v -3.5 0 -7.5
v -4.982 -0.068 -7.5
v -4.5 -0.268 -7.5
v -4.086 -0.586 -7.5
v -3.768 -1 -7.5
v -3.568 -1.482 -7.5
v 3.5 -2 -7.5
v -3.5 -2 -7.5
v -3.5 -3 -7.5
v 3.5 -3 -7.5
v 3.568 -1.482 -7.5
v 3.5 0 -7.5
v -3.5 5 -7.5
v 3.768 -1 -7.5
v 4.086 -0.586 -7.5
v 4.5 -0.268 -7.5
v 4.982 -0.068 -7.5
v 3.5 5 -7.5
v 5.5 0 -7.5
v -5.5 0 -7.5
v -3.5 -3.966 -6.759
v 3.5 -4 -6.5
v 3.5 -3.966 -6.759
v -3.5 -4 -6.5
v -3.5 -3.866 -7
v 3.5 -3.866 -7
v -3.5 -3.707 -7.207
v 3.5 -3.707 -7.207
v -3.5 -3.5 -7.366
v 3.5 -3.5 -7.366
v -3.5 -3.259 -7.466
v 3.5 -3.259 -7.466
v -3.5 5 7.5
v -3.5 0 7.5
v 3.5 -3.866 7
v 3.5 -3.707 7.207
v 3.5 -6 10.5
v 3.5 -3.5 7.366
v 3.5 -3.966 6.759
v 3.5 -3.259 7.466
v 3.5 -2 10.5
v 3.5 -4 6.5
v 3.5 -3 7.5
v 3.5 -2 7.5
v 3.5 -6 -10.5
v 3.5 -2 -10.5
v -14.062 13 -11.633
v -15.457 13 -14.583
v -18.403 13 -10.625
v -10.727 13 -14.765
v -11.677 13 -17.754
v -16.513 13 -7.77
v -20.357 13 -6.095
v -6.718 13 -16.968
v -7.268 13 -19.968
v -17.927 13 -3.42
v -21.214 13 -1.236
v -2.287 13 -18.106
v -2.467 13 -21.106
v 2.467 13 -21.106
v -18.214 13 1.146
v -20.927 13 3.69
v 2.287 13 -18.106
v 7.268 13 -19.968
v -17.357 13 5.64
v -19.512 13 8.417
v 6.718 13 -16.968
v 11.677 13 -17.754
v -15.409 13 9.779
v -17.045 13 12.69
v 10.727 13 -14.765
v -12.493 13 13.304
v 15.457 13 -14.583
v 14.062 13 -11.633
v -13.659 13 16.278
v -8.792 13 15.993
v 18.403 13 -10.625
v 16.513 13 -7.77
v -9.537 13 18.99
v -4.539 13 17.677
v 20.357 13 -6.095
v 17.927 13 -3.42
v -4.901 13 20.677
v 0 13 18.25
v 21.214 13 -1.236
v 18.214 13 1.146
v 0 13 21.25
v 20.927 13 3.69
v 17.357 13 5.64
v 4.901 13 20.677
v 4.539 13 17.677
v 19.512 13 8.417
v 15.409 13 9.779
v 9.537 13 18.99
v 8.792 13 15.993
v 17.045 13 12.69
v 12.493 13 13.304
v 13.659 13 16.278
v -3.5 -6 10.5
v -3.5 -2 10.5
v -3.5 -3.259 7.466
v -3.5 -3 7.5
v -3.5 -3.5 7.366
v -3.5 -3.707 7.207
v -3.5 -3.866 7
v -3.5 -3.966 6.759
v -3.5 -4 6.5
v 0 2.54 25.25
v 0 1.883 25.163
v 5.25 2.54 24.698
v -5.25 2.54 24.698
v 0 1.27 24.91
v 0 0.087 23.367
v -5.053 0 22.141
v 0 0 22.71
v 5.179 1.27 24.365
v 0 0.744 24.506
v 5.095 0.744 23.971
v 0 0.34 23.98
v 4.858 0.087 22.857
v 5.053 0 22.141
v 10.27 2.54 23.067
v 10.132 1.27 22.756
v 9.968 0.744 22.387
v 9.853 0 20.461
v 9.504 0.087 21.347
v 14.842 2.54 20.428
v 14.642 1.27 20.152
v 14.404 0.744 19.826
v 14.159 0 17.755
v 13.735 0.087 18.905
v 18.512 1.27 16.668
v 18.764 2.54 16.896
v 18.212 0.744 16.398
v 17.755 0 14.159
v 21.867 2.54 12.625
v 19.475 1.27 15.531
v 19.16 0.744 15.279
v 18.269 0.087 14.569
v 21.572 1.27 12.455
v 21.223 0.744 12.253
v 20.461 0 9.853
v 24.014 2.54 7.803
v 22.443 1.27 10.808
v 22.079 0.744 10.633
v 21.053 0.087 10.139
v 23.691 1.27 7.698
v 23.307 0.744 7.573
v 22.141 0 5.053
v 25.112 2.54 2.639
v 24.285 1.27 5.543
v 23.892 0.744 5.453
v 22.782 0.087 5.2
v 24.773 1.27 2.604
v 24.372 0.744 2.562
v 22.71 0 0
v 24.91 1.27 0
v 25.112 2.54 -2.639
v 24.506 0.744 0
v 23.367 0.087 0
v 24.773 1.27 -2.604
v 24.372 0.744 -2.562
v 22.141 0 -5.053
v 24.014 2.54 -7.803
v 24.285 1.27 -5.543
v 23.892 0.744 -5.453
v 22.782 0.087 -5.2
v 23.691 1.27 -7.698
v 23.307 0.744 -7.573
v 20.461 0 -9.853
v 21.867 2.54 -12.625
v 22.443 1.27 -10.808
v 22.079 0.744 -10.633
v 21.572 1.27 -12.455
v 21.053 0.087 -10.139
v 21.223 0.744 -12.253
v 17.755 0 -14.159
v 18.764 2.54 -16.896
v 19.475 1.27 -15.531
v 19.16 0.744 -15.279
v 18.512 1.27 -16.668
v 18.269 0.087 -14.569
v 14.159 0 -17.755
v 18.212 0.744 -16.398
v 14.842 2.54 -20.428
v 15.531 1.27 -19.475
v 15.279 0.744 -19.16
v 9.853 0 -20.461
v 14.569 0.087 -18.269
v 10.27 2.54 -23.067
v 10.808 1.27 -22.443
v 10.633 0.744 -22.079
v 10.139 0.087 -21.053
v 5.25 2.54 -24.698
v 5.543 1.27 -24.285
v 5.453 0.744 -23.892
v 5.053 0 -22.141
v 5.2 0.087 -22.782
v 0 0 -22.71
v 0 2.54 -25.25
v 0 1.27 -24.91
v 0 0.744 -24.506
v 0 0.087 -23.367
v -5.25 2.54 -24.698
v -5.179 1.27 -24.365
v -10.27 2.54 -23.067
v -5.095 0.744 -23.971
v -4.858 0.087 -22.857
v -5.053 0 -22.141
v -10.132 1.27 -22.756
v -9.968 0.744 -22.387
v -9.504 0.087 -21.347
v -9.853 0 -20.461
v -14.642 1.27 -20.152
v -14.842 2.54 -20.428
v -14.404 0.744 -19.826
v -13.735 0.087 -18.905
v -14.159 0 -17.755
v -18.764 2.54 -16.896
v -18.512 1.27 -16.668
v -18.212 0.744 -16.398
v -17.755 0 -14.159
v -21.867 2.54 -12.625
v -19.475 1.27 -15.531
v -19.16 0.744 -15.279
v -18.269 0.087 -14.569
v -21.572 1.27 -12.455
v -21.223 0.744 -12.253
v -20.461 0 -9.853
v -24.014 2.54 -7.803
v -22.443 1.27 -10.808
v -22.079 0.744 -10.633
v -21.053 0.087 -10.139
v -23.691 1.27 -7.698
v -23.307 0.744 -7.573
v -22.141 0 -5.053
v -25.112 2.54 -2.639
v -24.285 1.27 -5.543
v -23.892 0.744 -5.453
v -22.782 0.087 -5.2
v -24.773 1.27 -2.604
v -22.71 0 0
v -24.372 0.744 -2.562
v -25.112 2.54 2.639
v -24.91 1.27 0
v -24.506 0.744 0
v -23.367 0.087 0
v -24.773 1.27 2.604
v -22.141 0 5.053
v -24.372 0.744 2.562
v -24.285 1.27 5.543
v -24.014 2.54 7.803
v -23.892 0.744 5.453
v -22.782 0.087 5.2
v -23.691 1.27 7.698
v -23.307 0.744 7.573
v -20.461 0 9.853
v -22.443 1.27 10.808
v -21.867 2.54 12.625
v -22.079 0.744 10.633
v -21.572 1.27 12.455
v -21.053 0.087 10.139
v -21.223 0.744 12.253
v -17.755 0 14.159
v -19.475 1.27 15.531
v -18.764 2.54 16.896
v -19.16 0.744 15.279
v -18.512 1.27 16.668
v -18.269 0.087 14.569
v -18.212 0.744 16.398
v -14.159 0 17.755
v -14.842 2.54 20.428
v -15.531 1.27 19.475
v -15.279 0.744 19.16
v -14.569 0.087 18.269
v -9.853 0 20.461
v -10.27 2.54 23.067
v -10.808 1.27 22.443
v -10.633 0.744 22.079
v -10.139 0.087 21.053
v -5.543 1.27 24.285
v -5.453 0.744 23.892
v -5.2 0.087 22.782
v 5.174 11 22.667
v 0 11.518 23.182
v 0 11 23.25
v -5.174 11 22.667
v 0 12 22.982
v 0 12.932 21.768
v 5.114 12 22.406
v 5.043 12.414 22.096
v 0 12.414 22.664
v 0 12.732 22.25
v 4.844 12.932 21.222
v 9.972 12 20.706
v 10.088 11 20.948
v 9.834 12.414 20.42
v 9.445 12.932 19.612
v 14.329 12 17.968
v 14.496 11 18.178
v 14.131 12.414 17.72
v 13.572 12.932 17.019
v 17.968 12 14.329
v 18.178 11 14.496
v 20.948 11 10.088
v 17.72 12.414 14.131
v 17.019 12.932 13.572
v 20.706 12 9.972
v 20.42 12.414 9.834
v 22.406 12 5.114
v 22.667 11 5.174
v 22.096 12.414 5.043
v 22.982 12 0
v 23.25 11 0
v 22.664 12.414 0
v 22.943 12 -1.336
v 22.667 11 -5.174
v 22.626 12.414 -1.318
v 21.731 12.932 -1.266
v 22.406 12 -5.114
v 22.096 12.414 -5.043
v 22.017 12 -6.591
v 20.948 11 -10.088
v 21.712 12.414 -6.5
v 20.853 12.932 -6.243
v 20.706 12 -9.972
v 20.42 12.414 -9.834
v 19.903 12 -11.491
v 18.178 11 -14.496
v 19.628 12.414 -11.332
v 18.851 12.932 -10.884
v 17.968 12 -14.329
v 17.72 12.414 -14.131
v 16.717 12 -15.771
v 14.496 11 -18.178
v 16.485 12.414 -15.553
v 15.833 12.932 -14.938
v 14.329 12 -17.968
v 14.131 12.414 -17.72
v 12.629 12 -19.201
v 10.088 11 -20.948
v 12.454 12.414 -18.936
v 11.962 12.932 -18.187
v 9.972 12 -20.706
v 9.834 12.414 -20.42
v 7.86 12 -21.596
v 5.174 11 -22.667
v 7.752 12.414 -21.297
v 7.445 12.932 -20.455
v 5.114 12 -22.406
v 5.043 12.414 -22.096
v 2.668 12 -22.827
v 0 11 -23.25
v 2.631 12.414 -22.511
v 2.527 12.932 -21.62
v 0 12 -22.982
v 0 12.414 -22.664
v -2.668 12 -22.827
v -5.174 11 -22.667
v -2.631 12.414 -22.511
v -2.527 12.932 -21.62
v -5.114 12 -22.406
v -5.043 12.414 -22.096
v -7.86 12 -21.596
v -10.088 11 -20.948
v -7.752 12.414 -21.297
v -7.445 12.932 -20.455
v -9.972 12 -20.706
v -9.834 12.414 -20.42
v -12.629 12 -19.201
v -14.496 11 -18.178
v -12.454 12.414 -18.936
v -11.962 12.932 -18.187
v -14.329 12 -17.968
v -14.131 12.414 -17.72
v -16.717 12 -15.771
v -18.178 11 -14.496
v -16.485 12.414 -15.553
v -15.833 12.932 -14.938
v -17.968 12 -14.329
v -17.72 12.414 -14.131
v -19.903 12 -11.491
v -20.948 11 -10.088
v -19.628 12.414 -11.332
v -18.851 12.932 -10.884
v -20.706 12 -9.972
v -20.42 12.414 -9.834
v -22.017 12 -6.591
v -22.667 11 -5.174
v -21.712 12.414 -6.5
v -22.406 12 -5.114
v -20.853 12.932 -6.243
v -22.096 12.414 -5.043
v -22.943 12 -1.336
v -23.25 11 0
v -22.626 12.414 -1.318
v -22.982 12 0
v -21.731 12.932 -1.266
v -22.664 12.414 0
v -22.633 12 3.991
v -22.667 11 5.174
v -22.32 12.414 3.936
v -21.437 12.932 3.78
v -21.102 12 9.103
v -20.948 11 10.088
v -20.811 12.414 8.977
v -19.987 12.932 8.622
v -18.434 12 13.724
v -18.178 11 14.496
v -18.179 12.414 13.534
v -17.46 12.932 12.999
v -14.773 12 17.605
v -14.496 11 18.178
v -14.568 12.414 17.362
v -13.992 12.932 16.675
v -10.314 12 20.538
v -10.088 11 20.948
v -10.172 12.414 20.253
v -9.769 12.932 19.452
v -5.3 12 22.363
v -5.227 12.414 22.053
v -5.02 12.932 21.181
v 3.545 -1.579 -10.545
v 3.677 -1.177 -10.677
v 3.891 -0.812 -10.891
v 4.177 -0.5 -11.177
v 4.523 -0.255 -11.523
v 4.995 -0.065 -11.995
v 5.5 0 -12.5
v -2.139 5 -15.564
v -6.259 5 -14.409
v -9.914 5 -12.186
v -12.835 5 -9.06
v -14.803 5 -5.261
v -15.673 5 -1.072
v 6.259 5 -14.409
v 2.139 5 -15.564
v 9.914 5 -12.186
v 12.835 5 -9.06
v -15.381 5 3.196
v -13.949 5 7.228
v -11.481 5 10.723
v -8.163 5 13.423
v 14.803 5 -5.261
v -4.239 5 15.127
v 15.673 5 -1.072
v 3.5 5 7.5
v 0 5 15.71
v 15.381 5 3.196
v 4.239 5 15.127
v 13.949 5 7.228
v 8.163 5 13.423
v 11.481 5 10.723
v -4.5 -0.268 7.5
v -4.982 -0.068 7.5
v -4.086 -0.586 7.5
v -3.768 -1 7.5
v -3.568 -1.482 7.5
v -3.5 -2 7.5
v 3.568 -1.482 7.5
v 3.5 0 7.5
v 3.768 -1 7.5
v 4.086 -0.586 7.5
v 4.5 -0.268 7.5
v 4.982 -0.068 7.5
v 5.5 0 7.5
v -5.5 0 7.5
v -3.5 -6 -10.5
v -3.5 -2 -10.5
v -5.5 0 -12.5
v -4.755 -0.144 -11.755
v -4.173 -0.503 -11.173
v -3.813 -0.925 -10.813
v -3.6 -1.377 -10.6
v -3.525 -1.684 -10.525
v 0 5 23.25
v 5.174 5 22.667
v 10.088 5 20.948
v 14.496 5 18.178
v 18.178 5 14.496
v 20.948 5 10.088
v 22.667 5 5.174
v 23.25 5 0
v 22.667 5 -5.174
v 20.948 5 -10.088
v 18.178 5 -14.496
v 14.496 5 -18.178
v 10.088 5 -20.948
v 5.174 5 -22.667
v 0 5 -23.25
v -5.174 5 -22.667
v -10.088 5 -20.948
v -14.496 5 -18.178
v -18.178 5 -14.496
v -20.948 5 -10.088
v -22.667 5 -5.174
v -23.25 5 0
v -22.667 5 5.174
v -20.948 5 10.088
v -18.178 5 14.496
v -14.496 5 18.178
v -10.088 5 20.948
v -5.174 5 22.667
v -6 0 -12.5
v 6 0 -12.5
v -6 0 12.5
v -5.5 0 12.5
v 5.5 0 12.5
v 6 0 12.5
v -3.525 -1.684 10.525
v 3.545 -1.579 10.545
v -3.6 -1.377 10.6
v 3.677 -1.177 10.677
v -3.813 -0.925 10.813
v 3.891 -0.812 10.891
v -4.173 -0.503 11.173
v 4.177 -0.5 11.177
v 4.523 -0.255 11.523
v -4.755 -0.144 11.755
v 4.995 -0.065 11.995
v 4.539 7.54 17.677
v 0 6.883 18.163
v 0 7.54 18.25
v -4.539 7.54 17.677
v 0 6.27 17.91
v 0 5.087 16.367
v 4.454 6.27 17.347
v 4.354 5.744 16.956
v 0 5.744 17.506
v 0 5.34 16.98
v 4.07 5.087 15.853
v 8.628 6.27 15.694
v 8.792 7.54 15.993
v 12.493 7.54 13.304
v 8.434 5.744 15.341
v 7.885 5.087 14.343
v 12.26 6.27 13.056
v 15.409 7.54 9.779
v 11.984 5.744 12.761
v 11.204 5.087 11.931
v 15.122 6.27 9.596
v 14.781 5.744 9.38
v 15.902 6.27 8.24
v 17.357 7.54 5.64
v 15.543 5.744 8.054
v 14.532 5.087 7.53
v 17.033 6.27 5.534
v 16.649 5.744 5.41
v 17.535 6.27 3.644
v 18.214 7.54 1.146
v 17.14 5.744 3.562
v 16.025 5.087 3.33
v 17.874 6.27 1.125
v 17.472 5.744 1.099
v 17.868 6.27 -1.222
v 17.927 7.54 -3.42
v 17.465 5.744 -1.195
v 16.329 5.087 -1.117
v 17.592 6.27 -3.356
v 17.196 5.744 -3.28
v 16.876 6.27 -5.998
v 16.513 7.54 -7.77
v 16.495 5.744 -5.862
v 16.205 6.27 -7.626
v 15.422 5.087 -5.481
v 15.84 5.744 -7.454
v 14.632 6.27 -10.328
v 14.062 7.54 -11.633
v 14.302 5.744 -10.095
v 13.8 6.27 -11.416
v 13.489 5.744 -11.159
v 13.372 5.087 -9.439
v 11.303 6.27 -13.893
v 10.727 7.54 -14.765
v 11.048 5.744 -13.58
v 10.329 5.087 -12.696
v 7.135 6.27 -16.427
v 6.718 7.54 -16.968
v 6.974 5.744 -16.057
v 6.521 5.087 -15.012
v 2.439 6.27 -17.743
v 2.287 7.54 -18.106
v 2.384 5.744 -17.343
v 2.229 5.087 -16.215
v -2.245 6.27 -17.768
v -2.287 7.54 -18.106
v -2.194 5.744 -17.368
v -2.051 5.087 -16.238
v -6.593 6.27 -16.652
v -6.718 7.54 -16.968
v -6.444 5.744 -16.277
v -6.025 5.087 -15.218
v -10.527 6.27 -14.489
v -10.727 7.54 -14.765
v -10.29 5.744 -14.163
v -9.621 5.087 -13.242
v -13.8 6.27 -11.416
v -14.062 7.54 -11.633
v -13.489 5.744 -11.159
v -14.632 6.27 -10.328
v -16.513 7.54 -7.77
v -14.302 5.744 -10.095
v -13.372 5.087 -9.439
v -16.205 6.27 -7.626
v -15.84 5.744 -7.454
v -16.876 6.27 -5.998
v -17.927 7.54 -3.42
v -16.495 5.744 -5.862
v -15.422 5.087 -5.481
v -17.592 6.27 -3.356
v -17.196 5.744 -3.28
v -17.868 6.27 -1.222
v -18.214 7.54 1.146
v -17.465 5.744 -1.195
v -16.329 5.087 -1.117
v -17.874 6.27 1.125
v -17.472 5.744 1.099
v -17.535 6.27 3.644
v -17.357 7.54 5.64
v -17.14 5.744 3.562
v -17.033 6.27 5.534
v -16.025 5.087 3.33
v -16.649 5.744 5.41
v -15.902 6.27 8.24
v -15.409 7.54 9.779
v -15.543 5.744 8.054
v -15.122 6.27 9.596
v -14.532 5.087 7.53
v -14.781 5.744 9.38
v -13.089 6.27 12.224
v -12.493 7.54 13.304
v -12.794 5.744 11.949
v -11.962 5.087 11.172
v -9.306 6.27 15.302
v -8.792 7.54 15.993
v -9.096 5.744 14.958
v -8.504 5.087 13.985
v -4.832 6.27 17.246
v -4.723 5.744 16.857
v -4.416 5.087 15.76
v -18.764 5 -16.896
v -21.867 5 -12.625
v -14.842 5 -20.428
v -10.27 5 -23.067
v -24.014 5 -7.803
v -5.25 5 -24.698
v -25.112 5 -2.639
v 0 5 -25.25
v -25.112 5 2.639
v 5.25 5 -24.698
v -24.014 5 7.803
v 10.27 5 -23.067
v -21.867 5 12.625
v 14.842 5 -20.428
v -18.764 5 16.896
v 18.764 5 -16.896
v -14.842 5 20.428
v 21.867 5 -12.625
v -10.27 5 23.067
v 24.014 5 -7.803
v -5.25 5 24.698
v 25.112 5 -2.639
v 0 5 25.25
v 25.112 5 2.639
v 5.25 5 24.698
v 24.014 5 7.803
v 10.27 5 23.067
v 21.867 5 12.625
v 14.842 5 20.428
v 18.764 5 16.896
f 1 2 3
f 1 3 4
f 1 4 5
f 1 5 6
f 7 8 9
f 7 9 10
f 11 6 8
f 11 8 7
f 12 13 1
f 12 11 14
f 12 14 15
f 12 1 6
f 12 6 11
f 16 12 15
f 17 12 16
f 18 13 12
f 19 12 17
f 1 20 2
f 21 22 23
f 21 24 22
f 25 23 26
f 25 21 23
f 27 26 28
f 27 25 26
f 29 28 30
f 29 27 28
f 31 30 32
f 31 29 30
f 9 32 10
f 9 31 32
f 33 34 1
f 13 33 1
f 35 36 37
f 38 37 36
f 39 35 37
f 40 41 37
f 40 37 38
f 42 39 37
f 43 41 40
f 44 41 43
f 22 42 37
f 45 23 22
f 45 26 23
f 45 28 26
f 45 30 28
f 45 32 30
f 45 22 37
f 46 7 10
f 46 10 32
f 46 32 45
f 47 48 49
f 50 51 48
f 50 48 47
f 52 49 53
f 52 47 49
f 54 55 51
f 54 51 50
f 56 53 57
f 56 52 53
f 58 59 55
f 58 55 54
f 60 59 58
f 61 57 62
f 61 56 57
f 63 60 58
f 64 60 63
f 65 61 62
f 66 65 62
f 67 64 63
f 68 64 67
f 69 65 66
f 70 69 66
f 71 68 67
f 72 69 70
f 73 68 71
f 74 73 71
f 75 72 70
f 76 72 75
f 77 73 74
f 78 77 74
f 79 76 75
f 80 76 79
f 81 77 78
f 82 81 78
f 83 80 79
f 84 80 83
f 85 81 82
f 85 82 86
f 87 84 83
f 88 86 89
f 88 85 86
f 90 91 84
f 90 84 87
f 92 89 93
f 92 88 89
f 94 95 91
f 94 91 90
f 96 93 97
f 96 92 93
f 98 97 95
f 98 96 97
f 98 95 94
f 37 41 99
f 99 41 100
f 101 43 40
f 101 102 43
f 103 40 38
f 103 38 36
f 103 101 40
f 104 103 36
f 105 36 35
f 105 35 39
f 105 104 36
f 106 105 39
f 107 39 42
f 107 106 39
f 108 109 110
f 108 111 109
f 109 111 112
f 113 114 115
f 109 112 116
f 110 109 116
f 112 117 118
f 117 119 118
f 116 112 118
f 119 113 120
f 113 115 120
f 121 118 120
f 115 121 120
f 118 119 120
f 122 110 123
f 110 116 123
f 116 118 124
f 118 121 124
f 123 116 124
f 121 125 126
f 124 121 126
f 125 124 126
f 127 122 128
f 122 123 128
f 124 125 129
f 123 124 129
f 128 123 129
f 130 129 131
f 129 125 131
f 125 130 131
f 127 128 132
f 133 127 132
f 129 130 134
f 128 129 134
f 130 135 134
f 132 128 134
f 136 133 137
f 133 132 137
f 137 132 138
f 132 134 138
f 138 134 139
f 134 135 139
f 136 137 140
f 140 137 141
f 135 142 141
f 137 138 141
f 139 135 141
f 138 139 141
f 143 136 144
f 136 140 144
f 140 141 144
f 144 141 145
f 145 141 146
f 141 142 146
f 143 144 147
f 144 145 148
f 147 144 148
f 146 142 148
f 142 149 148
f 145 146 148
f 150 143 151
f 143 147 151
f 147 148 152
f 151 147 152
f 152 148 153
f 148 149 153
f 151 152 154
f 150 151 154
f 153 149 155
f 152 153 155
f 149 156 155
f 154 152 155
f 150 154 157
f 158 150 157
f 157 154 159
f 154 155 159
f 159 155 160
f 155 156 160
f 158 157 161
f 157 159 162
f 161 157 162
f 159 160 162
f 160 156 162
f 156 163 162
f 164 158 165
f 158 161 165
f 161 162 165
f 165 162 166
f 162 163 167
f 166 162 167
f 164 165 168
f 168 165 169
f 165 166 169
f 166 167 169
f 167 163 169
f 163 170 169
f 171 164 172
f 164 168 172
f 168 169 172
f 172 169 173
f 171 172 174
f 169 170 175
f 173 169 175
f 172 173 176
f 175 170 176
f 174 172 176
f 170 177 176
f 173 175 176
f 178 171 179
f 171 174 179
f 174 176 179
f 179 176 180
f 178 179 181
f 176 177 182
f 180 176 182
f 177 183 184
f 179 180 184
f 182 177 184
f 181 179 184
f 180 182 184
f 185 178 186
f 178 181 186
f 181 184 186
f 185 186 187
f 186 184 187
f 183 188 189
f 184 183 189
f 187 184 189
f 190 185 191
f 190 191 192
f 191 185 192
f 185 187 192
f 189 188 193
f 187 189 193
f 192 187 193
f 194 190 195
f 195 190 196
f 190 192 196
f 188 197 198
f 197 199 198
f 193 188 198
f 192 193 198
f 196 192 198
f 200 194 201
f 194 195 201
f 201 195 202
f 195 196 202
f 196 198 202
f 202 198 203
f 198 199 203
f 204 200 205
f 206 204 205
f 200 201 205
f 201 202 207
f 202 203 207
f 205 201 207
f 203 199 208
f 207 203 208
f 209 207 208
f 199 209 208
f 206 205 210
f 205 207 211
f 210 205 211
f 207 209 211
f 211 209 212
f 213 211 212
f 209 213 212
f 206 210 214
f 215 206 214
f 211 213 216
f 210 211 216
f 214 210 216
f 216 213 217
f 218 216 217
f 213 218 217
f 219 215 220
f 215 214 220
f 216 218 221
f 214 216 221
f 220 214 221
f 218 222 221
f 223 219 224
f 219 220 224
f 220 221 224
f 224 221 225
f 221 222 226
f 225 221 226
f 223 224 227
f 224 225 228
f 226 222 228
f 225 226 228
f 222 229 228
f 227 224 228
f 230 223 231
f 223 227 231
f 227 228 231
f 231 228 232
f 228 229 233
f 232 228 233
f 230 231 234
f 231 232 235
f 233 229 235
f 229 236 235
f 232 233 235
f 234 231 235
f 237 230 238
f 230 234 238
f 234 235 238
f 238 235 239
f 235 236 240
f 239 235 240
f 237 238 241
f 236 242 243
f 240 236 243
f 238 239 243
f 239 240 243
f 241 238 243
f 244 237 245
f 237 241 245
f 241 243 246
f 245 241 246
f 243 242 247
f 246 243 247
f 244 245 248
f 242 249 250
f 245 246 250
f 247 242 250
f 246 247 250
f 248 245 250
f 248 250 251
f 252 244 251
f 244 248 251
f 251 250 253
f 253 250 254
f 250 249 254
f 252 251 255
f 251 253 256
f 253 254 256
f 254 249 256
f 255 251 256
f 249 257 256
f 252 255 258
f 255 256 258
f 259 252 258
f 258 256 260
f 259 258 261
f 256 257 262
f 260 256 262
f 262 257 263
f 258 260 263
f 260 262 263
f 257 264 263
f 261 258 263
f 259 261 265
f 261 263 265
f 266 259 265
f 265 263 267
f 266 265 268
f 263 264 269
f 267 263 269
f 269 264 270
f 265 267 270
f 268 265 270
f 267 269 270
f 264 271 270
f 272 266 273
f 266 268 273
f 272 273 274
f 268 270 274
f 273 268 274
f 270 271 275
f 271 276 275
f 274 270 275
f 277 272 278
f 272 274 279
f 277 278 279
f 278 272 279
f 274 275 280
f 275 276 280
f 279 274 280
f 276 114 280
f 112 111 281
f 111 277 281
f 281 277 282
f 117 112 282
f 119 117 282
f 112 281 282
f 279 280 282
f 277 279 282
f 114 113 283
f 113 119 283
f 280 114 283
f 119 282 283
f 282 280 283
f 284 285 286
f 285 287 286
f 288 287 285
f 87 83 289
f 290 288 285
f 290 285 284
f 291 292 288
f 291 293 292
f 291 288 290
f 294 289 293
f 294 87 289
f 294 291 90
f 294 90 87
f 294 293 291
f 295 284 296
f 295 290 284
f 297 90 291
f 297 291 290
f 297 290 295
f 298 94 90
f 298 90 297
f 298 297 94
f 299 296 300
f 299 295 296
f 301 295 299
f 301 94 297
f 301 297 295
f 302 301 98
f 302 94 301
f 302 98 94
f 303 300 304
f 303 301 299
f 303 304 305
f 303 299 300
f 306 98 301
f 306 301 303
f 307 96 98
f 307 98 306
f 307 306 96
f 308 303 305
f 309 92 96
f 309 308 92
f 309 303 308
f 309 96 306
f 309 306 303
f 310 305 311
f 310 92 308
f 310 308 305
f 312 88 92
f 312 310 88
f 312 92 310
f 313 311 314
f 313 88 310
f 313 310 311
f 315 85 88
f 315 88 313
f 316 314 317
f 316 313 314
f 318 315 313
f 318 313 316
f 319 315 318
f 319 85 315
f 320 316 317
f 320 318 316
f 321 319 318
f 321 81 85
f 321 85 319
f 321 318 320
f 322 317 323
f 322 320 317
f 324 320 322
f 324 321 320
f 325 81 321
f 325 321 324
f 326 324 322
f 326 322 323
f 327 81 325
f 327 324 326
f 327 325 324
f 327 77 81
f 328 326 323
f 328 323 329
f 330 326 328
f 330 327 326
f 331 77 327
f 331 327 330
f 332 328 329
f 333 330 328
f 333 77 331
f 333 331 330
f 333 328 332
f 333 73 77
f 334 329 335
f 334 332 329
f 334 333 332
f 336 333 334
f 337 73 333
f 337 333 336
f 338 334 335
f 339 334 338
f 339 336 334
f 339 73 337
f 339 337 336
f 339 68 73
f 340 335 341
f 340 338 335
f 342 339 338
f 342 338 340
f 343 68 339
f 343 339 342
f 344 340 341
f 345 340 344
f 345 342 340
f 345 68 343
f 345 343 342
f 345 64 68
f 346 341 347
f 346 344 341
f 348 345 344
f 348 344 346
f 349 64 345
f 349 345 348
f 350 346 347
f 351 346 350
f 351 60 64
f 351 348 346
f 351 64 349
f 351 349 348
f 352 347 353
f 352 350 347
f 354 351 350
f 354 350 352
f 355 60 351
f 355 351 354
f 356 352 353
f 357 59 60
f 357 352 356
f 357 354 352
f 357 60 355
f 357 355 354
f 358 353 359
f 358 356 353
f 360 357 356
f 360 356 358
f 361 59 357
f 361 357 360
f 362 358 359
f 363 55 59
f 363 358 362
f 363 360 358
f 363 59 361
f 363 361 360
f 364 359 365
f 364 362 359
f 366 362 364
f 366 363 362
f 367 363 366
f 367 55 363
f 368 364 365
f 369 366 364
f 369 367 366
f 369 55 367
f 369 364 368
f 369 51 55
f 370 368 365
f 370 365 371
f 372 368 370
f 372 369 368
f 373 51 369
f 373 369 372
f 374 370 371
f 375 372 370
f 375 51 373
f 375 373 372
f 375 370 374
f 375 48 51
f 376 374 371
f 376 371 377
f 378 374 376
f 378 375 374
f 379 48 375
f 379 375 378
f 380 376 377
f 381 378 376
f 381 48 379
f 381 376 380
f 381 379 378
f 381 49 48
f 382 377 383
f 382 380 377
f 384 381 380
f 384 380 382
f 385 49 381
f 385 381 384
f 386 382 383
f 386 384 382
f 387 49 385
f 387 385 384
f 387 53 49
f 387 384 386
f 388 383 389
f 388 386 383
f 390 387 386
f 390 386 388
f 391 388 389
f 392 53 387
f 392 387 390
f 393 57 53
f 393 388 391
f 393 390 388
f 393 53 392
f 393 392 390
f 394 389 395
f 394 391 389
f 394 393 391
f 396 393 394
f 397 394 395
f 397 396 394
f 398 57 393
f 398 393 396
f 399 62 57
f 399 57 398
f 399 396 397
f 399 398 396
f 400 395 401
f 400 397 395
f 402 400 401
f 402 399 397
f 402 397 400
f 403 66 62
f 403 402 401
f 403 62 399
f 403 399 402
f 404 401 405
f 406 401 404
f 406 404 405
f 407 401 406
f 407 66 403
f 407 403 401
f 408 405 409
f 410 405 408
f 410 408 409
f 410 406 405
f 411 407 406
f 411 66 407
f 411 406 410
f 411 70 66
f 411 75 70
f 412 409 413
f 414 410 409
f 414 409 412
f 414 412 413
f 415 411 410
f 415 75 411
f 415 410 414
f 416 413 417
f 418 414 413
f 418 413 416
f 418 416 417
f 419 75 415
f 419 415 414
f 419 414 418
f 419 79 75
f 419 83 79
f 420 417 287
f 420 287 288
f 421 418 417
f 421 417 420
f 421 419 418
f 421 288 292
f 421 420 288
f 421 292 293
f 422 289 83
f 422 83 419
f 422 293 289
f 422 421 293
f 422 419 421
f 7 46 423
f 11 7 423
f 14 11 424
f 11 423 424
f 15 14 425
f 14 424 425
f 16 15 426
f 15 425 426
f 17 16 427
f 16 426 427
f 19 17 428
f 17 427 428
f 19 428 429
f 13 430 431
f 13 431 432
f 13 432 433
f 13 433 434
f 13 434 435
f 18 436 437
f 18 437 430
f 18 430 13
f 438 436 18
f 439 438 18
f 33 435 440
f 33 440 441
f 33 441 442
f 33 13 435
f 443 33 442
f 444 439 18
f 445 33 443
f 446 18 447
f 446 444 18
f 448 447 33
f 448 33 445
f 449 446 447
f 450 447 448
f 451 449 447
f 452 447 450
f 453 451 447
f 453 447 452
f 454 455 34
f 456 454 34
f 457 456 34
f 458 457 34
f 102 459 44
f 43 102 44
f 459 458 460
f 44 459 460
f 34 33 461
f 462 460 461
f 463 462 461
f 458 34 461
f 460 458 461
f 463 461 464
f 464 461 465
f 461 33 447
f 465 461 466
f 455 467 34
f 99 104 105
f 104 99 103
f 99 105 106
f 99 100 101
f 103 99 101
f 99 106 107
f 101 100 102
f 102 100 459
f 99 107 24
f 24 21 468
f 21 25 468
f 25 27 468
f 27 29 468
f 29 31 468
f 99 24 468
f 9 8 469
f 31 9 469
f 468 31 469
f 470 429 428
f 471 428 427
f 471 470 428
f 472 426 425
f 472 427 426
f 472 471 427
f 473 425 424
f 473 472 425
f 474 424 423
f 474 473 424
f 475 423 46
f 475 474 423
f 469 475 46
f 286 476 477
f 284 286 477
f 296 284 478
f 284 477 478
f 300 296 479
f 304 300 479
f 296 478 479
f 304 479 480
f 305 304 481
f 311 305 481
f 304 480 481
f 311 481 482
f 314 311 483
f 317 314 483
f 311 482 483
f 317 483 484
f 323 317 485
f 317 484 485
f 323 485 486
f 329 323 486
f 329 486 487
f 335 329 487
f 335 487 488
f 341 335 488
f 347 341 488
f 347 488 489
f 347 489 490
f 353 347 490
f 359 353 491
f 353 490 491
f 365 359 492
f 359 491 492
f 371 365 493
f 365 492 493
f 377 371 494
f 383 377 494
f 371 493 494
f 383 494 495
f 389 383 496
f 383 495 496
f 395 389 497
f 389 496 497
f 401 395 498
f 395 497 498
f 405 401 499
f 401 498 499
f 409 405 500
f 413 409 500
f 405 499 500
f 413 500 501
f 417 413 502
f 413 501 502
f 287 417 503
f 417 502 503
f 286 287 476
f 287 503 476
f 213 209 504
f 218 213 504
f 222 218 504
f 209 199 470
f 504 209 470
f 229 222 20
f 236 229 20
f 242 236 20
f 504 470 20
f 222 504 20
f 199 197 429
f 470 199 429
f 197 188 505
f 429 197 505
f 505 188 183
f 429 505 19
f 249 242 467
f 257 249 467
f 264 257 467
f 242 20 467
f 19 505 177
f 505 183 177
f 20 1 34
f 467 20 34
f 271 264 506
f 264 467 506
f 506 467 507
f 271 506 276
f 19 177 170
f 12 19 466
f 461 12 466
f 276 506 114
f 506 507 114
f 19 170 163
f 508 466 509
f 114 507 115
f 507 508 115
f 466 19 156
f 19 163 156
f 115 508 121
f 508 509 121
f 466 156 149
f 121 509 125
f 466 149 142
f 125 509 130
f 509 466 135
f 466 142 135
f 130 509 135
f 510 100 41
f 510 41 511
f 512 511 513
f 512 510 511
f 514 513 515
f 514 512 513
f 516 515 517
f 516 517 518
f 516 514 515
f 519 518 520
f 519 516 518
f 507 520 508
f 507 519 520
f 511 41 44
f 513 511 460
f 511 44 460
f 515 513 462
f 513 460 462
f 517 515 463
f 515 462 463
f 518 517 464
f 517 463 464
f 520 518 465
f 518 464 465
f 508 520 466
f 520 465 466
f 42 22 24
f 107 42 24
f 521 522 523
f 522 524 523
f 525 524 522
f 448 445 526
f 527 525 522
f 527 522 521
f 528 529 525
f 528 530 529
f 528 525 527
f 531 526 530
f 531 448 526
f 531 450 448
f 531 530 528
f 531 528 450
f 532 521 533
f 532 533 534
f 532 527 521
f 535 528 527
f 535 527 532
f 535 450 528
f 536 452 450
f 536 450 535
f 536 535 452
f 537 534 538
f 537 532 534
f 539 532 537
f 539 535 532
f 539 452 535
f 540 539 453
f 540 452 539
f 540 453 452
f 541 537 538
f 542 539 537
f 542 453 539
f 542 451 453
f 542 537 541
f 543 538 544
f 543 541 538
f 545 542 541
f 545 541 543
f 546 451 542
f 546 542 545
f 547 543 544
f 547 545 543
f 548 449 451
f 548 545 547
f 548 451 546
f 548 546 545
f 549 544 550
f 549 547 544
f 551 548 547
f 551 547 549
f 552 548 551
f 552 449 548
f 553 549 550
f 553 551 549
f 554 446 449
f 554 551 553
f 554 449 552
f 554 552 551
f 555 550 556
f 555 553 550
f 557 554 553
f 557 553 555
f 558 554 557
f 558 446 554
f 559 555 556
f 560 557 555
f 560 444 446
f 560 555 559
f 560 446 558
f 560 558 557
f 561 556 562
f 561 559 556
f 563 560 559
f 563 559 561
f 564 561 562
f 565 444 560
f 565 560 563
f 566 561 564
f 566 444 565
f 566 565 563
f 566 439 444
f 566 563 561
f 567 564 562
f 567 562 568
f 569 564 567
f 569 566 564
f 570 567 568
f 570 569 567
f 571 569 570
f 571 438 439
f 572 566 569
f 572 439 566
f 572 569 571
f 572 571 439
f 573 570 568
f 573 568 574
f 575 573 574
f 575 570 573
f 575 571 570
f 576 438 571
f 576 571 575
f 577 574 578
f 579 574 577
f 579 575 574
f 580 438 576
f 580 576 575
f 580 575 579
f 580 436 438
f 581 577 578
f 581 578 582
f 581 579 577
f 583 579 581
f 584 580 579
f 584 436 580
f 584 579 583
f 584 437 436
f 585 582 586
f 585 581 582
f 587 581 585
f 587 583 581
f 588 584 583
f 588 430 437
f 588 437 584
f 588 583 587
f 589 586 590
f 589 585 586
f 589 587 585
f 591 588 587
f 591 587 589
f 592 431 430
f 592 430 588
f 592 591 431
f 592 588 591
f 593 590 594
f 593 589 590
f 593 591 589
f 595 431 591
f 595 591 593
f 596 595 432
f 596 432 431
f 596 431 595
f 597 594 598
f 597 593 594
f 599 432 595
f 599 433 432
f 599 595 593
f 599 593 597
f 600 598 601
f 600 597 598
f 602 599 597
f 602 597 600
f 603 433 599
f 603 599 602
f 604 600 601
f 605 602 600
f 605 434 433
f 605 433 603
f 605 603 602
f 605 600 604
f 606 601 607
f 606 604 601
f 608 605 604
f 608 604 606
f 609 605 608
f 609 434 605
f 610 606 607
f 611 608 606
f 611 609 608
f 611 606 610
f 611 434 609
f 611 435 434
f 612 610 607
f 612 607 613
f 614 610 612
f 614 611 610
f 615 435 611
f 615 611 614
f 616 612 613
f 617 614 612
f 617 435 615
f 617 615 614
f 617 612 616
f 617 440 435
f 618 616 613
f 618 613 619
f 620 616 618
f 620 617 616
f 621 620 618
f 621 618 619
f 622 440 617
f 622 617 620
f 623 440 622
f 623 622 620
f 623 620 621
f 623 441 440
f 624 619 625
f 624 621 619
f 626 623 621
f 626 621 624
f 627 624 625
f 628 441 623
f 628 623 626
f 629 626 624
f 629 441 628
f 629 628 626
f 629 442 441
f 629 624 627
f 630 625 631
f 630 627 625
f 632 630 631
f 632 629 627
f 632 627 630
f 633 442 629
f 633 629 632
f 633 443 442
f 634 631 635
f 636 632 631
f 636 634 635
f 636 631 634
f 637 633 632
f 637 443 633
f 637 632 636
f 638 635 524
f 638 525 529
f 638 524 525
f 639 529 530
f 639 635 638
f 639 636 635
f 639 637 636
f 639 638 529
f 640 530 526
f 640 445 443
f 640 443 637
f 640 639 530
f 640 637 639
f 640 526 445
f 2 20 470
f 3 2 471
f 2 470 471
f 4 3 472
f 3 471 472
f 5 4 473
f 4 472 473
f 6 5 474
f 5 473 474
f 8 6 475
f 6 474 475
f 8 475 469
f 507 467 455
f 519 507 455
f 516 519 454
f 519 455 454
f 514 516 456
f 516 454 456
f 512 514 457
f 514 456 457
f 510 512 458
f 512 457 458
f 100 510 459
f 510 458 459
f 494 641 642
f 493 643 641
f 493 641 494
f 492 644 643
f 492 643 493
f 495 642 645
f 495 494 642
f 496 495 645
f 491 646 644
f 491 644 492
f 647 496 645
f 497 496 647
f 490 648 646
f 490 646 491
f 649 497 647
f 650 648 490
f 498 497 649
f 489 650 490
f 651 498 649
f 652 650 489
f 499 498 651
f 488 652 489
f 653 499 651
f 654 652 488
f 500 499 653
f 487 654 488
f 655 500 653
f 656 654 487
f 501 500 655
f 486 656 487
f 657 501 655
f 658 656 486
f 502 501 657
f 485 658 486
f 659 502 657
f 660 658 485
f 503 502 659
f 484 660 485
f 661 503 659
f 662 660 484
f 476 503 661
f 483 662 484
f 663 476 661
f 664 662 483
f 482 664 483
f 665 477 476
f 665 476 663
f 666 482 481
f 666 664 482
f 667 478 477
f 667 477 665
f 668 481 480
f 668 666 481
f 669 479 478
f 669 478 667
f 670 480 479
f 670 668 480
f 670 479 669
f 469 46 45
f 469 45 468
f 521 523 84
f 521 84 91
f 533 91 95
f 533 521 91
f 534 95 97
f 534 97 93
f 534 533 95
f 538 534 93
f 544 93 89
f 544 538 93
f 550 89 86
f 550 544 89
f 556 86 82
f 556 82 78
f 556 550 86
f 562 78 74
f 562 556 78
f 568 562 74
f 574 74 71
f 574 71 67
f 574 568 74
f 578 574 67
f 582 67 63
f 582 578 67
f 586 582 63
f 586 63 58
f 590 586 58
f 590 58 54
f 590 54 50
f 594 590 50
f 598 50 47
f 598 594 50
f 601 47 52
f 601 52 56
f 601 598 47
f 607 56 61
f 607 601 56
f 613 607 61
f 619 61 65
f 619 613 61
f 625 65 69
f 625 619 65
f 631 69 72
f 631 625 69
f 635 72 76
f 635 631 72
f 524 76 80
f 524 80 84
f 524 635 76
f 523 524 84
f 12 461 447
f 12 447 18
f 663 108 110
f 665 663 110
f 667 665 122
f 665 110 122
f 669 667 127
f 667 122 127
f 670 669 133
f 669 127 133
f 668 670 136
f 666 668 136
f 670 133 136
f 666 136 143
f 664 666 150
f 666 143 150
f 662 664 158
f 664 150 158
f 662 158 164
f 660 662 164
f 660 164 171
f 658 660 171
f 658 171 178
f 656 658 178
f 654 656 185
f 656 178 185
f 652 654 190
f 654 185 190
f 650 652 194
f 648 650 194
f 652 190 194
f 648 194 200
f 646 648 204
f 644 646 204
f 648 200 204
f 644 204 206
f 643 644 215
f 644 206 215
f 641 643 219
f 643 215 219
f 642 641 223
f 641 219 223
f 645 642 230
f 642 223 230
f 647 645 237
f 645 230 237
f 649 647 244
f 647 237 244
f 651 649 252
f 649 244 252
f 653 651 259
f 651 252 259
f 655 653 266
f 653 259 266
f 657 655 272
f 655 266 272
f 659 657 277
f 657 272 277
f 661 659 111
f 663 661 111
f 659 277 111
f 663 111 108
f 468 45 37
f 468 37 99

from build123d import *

# Parameters (mm, degrees)
SKETCH1_R           = 25.25
BOSS_EXTRUDE1_DEPTH = 5
SKETCH2_R           = 23.25
SKETCH2_R_2         = 18.25
BOSS_EXTRUDE2_DEPTH = 8
FILLET1_R           = 2.54
FILLET3_R           = 2
SKETCH3_W           = 7
SKETCH3_H           = 15
CUT_EXTRUDE1_DEPTH  = 39.001644834
SKETCH4_W           = 7
SKETCH4_H           = 3
BOSS_EXTRUDE3_DEPTH = 4
SKETCH5_W           = 7
SKETCH5_H           = 21
BOSS_EXTRUDE4_DEPTH = 2
FILLET4_R           = 2
FILLET5_R           = 1
FILLET6_START       = -12.5
FILLET6_DEPTH       = 5
FILLET6_START_2     = 7.5
FILLET6_2_DEPTH     = 5
FILLET6_START_3     = -6
FILLET6_3_DEPTH     = 12


with BuildPart() as part:
    # Sketch1 → Boss-Extrude1 (new body)
    with BuildSketch(Plane(origin=(0, 0, 0), x_dir=(1, 0, 0), z_dir=(0, 1, 0))):
        with Locations(Location((0, 0, 0), (0, 0, 270))):
            Circle(SKETCH1_R)
    extrude(amount=BOSS_EXTRUDE1_DEPTH)

    # Sketch2 → Boss-Extrude2 (add)
    with BuildSketch(Plane(origin=(0, 5, 0), x_dir=(1, 0, 0), z_dir=(0, 1, 0))):
        with Locations(Location((0, 0, 0), (0, 0, 270))):
            Circle(SKETCH2_R)
        with Locations(Location((0, 0, 0), (0, 0, 270))):
            Circle(SKETCH2_R_2, mode=Mode.SUBTRACT)
    extrude(amount=BOSS_EXTRUDE2_DEPTH)

    # Fillet1
    fillet1_edges = [part.edges().sort_by_distance(p)[0] for p in [
        (0, 0, -25.25),
        (0, 5, -18.25),
    ]]
    fillet(fillet1_edges, radius=FILLET1_R)

    # Fillet3
    fillet3_edges = [part.edges().sort_by_distance(p)[0] for p in [
        (0, 13, -23.25),
    ]]
    fillet(fillet3_edges, radius=FILLET3_R)

    # Sketch3 → Cut-Extrude1 (cut, through all)
    with BuildSketch(Plane(origin=(0, 0, 0), x_dir=(-1, 0, 0), z_dir=(0, -1, 0))):
        Rectangle(SKETCH3_W, SKETCH3_H)
    extrude(amount=-CUT_EXTRUDE1_DEPTH, mode=Mode.SUBTRACT)

    # Sketch4 → Boss-Extrude3 (add)
    with BuildSketch(Plane(origin=(0, 0, 0), x_dir=(-1, 0, 0), z_dir=(0, -1, 0))):
        with Locations((0, 9)):
            Rectangle(SKETCH4_W, SKETCH4_H)
        with Locations((0, -9)):
            Rectangle(SKETCH4_W, SKETCH4_H)
    extrude(amount=BOSS_EXTRUDE3_DEPTH)

    # Sketch5 → Boss-Extrude4 (add)
    with BuildSketch(Plane(origin=(0, -4, 0), x_dir=(-1, 0, 0), z_dir=(0, -1, 0))):
        Rectangle(SKETCH5_W, SKETCH5_H)
    extrude(amount=BOSS_EXTRUDE4_DEPTH)

    # Fillet4
    fillet4_edges = [part.edges().sort_by_distance(p)[0] for p in [
        (0, 0, -10.5),
        (0, 0, 10.5),
    ]]
    fillet(fillet4_edges, radius=FILLET4_R)

    # Fillet5
    fillet5_edges = [part.edges().sort_by_distance(p)[0] for p in [
        (0, -4, -7.5),
        (0, -4, 7.5),
    ]]
    fillet(fillet5_edges, radius=FILLET5_R)

    # Fillet6: read off the stored shape, not the designer's step
    # Fillet6 outline → Fillet6 (add)
    with BuildSketch(Plane.XY.offset(FILLET6_START)):
        with BuildLine():
            Line((5.5, 0), (3.5, 0))
            Line((3.5, 0), (3.5, -2))
            ThreePointArc((3.5, -2), (4.085786438, -0.585786438), (5.5, 0))
        make_face()
        with BuildLine():
            ThreePointArc((-5.5, 0), (-4.085786438, -0.585786438), (-3.5, -2))
            Line((-3.5, -2), (-3.5, 0))
            Line((-3.5, 0), (-5.5, 0))
        make_face()
    extrude(amount=FILLET6_DEPTH)

    # Fillet6 2 outline → Fillet6 2 (add)
    with BuildSketch(Plane.XY.offset(FILLET6_START_2)):
        with BuildLine():
            Line((5.5, 0), (3.5, 0))
            Line((3.5, 0), (3.5, -2))
            ThreePointArc((3.5, -2), (4.085786438, -0.585786438), (5.5, 0))
        make_face()
        with BuildLine():
            ThreePointArc((-5.5, 0), (-4.085786438, -0.585786438), (-3.5, -2))
            Line((-3.5, -2), (-3.5, 0))
            Line((-3.5, 0), (-5.5, 0))
        make_face()
    extrude(amount=FILLET6_2_DEPTH)

    # Fillet6 3 outline → Fillet6 3 (cut)
    with BuildSketch(Plane.YZ.offset(FILLET6_START_3)):
        with BuildLine():
            Line((-2, -10.5), (-2, -12.5))
            Line((-2, -12.5), (0, -12.5))
            ThreePointArc((0, -12.5), (-0.585786438, -11.085786438), (-2, -10.5))
        make_face()
        with BuildLine():
            Line((-2, 12.5), (-2, 10.5))
            ThreePointArc((-2, 10.5), (-0.585786438, 11.085786438), (0, 12.5))
            Line((0, 12.5), (-2, 12.5))
        make_face()
    extrude(amount=FILLET6_3_DEPTH, mode=Mode.SUBTRACT)


solid = part.part
